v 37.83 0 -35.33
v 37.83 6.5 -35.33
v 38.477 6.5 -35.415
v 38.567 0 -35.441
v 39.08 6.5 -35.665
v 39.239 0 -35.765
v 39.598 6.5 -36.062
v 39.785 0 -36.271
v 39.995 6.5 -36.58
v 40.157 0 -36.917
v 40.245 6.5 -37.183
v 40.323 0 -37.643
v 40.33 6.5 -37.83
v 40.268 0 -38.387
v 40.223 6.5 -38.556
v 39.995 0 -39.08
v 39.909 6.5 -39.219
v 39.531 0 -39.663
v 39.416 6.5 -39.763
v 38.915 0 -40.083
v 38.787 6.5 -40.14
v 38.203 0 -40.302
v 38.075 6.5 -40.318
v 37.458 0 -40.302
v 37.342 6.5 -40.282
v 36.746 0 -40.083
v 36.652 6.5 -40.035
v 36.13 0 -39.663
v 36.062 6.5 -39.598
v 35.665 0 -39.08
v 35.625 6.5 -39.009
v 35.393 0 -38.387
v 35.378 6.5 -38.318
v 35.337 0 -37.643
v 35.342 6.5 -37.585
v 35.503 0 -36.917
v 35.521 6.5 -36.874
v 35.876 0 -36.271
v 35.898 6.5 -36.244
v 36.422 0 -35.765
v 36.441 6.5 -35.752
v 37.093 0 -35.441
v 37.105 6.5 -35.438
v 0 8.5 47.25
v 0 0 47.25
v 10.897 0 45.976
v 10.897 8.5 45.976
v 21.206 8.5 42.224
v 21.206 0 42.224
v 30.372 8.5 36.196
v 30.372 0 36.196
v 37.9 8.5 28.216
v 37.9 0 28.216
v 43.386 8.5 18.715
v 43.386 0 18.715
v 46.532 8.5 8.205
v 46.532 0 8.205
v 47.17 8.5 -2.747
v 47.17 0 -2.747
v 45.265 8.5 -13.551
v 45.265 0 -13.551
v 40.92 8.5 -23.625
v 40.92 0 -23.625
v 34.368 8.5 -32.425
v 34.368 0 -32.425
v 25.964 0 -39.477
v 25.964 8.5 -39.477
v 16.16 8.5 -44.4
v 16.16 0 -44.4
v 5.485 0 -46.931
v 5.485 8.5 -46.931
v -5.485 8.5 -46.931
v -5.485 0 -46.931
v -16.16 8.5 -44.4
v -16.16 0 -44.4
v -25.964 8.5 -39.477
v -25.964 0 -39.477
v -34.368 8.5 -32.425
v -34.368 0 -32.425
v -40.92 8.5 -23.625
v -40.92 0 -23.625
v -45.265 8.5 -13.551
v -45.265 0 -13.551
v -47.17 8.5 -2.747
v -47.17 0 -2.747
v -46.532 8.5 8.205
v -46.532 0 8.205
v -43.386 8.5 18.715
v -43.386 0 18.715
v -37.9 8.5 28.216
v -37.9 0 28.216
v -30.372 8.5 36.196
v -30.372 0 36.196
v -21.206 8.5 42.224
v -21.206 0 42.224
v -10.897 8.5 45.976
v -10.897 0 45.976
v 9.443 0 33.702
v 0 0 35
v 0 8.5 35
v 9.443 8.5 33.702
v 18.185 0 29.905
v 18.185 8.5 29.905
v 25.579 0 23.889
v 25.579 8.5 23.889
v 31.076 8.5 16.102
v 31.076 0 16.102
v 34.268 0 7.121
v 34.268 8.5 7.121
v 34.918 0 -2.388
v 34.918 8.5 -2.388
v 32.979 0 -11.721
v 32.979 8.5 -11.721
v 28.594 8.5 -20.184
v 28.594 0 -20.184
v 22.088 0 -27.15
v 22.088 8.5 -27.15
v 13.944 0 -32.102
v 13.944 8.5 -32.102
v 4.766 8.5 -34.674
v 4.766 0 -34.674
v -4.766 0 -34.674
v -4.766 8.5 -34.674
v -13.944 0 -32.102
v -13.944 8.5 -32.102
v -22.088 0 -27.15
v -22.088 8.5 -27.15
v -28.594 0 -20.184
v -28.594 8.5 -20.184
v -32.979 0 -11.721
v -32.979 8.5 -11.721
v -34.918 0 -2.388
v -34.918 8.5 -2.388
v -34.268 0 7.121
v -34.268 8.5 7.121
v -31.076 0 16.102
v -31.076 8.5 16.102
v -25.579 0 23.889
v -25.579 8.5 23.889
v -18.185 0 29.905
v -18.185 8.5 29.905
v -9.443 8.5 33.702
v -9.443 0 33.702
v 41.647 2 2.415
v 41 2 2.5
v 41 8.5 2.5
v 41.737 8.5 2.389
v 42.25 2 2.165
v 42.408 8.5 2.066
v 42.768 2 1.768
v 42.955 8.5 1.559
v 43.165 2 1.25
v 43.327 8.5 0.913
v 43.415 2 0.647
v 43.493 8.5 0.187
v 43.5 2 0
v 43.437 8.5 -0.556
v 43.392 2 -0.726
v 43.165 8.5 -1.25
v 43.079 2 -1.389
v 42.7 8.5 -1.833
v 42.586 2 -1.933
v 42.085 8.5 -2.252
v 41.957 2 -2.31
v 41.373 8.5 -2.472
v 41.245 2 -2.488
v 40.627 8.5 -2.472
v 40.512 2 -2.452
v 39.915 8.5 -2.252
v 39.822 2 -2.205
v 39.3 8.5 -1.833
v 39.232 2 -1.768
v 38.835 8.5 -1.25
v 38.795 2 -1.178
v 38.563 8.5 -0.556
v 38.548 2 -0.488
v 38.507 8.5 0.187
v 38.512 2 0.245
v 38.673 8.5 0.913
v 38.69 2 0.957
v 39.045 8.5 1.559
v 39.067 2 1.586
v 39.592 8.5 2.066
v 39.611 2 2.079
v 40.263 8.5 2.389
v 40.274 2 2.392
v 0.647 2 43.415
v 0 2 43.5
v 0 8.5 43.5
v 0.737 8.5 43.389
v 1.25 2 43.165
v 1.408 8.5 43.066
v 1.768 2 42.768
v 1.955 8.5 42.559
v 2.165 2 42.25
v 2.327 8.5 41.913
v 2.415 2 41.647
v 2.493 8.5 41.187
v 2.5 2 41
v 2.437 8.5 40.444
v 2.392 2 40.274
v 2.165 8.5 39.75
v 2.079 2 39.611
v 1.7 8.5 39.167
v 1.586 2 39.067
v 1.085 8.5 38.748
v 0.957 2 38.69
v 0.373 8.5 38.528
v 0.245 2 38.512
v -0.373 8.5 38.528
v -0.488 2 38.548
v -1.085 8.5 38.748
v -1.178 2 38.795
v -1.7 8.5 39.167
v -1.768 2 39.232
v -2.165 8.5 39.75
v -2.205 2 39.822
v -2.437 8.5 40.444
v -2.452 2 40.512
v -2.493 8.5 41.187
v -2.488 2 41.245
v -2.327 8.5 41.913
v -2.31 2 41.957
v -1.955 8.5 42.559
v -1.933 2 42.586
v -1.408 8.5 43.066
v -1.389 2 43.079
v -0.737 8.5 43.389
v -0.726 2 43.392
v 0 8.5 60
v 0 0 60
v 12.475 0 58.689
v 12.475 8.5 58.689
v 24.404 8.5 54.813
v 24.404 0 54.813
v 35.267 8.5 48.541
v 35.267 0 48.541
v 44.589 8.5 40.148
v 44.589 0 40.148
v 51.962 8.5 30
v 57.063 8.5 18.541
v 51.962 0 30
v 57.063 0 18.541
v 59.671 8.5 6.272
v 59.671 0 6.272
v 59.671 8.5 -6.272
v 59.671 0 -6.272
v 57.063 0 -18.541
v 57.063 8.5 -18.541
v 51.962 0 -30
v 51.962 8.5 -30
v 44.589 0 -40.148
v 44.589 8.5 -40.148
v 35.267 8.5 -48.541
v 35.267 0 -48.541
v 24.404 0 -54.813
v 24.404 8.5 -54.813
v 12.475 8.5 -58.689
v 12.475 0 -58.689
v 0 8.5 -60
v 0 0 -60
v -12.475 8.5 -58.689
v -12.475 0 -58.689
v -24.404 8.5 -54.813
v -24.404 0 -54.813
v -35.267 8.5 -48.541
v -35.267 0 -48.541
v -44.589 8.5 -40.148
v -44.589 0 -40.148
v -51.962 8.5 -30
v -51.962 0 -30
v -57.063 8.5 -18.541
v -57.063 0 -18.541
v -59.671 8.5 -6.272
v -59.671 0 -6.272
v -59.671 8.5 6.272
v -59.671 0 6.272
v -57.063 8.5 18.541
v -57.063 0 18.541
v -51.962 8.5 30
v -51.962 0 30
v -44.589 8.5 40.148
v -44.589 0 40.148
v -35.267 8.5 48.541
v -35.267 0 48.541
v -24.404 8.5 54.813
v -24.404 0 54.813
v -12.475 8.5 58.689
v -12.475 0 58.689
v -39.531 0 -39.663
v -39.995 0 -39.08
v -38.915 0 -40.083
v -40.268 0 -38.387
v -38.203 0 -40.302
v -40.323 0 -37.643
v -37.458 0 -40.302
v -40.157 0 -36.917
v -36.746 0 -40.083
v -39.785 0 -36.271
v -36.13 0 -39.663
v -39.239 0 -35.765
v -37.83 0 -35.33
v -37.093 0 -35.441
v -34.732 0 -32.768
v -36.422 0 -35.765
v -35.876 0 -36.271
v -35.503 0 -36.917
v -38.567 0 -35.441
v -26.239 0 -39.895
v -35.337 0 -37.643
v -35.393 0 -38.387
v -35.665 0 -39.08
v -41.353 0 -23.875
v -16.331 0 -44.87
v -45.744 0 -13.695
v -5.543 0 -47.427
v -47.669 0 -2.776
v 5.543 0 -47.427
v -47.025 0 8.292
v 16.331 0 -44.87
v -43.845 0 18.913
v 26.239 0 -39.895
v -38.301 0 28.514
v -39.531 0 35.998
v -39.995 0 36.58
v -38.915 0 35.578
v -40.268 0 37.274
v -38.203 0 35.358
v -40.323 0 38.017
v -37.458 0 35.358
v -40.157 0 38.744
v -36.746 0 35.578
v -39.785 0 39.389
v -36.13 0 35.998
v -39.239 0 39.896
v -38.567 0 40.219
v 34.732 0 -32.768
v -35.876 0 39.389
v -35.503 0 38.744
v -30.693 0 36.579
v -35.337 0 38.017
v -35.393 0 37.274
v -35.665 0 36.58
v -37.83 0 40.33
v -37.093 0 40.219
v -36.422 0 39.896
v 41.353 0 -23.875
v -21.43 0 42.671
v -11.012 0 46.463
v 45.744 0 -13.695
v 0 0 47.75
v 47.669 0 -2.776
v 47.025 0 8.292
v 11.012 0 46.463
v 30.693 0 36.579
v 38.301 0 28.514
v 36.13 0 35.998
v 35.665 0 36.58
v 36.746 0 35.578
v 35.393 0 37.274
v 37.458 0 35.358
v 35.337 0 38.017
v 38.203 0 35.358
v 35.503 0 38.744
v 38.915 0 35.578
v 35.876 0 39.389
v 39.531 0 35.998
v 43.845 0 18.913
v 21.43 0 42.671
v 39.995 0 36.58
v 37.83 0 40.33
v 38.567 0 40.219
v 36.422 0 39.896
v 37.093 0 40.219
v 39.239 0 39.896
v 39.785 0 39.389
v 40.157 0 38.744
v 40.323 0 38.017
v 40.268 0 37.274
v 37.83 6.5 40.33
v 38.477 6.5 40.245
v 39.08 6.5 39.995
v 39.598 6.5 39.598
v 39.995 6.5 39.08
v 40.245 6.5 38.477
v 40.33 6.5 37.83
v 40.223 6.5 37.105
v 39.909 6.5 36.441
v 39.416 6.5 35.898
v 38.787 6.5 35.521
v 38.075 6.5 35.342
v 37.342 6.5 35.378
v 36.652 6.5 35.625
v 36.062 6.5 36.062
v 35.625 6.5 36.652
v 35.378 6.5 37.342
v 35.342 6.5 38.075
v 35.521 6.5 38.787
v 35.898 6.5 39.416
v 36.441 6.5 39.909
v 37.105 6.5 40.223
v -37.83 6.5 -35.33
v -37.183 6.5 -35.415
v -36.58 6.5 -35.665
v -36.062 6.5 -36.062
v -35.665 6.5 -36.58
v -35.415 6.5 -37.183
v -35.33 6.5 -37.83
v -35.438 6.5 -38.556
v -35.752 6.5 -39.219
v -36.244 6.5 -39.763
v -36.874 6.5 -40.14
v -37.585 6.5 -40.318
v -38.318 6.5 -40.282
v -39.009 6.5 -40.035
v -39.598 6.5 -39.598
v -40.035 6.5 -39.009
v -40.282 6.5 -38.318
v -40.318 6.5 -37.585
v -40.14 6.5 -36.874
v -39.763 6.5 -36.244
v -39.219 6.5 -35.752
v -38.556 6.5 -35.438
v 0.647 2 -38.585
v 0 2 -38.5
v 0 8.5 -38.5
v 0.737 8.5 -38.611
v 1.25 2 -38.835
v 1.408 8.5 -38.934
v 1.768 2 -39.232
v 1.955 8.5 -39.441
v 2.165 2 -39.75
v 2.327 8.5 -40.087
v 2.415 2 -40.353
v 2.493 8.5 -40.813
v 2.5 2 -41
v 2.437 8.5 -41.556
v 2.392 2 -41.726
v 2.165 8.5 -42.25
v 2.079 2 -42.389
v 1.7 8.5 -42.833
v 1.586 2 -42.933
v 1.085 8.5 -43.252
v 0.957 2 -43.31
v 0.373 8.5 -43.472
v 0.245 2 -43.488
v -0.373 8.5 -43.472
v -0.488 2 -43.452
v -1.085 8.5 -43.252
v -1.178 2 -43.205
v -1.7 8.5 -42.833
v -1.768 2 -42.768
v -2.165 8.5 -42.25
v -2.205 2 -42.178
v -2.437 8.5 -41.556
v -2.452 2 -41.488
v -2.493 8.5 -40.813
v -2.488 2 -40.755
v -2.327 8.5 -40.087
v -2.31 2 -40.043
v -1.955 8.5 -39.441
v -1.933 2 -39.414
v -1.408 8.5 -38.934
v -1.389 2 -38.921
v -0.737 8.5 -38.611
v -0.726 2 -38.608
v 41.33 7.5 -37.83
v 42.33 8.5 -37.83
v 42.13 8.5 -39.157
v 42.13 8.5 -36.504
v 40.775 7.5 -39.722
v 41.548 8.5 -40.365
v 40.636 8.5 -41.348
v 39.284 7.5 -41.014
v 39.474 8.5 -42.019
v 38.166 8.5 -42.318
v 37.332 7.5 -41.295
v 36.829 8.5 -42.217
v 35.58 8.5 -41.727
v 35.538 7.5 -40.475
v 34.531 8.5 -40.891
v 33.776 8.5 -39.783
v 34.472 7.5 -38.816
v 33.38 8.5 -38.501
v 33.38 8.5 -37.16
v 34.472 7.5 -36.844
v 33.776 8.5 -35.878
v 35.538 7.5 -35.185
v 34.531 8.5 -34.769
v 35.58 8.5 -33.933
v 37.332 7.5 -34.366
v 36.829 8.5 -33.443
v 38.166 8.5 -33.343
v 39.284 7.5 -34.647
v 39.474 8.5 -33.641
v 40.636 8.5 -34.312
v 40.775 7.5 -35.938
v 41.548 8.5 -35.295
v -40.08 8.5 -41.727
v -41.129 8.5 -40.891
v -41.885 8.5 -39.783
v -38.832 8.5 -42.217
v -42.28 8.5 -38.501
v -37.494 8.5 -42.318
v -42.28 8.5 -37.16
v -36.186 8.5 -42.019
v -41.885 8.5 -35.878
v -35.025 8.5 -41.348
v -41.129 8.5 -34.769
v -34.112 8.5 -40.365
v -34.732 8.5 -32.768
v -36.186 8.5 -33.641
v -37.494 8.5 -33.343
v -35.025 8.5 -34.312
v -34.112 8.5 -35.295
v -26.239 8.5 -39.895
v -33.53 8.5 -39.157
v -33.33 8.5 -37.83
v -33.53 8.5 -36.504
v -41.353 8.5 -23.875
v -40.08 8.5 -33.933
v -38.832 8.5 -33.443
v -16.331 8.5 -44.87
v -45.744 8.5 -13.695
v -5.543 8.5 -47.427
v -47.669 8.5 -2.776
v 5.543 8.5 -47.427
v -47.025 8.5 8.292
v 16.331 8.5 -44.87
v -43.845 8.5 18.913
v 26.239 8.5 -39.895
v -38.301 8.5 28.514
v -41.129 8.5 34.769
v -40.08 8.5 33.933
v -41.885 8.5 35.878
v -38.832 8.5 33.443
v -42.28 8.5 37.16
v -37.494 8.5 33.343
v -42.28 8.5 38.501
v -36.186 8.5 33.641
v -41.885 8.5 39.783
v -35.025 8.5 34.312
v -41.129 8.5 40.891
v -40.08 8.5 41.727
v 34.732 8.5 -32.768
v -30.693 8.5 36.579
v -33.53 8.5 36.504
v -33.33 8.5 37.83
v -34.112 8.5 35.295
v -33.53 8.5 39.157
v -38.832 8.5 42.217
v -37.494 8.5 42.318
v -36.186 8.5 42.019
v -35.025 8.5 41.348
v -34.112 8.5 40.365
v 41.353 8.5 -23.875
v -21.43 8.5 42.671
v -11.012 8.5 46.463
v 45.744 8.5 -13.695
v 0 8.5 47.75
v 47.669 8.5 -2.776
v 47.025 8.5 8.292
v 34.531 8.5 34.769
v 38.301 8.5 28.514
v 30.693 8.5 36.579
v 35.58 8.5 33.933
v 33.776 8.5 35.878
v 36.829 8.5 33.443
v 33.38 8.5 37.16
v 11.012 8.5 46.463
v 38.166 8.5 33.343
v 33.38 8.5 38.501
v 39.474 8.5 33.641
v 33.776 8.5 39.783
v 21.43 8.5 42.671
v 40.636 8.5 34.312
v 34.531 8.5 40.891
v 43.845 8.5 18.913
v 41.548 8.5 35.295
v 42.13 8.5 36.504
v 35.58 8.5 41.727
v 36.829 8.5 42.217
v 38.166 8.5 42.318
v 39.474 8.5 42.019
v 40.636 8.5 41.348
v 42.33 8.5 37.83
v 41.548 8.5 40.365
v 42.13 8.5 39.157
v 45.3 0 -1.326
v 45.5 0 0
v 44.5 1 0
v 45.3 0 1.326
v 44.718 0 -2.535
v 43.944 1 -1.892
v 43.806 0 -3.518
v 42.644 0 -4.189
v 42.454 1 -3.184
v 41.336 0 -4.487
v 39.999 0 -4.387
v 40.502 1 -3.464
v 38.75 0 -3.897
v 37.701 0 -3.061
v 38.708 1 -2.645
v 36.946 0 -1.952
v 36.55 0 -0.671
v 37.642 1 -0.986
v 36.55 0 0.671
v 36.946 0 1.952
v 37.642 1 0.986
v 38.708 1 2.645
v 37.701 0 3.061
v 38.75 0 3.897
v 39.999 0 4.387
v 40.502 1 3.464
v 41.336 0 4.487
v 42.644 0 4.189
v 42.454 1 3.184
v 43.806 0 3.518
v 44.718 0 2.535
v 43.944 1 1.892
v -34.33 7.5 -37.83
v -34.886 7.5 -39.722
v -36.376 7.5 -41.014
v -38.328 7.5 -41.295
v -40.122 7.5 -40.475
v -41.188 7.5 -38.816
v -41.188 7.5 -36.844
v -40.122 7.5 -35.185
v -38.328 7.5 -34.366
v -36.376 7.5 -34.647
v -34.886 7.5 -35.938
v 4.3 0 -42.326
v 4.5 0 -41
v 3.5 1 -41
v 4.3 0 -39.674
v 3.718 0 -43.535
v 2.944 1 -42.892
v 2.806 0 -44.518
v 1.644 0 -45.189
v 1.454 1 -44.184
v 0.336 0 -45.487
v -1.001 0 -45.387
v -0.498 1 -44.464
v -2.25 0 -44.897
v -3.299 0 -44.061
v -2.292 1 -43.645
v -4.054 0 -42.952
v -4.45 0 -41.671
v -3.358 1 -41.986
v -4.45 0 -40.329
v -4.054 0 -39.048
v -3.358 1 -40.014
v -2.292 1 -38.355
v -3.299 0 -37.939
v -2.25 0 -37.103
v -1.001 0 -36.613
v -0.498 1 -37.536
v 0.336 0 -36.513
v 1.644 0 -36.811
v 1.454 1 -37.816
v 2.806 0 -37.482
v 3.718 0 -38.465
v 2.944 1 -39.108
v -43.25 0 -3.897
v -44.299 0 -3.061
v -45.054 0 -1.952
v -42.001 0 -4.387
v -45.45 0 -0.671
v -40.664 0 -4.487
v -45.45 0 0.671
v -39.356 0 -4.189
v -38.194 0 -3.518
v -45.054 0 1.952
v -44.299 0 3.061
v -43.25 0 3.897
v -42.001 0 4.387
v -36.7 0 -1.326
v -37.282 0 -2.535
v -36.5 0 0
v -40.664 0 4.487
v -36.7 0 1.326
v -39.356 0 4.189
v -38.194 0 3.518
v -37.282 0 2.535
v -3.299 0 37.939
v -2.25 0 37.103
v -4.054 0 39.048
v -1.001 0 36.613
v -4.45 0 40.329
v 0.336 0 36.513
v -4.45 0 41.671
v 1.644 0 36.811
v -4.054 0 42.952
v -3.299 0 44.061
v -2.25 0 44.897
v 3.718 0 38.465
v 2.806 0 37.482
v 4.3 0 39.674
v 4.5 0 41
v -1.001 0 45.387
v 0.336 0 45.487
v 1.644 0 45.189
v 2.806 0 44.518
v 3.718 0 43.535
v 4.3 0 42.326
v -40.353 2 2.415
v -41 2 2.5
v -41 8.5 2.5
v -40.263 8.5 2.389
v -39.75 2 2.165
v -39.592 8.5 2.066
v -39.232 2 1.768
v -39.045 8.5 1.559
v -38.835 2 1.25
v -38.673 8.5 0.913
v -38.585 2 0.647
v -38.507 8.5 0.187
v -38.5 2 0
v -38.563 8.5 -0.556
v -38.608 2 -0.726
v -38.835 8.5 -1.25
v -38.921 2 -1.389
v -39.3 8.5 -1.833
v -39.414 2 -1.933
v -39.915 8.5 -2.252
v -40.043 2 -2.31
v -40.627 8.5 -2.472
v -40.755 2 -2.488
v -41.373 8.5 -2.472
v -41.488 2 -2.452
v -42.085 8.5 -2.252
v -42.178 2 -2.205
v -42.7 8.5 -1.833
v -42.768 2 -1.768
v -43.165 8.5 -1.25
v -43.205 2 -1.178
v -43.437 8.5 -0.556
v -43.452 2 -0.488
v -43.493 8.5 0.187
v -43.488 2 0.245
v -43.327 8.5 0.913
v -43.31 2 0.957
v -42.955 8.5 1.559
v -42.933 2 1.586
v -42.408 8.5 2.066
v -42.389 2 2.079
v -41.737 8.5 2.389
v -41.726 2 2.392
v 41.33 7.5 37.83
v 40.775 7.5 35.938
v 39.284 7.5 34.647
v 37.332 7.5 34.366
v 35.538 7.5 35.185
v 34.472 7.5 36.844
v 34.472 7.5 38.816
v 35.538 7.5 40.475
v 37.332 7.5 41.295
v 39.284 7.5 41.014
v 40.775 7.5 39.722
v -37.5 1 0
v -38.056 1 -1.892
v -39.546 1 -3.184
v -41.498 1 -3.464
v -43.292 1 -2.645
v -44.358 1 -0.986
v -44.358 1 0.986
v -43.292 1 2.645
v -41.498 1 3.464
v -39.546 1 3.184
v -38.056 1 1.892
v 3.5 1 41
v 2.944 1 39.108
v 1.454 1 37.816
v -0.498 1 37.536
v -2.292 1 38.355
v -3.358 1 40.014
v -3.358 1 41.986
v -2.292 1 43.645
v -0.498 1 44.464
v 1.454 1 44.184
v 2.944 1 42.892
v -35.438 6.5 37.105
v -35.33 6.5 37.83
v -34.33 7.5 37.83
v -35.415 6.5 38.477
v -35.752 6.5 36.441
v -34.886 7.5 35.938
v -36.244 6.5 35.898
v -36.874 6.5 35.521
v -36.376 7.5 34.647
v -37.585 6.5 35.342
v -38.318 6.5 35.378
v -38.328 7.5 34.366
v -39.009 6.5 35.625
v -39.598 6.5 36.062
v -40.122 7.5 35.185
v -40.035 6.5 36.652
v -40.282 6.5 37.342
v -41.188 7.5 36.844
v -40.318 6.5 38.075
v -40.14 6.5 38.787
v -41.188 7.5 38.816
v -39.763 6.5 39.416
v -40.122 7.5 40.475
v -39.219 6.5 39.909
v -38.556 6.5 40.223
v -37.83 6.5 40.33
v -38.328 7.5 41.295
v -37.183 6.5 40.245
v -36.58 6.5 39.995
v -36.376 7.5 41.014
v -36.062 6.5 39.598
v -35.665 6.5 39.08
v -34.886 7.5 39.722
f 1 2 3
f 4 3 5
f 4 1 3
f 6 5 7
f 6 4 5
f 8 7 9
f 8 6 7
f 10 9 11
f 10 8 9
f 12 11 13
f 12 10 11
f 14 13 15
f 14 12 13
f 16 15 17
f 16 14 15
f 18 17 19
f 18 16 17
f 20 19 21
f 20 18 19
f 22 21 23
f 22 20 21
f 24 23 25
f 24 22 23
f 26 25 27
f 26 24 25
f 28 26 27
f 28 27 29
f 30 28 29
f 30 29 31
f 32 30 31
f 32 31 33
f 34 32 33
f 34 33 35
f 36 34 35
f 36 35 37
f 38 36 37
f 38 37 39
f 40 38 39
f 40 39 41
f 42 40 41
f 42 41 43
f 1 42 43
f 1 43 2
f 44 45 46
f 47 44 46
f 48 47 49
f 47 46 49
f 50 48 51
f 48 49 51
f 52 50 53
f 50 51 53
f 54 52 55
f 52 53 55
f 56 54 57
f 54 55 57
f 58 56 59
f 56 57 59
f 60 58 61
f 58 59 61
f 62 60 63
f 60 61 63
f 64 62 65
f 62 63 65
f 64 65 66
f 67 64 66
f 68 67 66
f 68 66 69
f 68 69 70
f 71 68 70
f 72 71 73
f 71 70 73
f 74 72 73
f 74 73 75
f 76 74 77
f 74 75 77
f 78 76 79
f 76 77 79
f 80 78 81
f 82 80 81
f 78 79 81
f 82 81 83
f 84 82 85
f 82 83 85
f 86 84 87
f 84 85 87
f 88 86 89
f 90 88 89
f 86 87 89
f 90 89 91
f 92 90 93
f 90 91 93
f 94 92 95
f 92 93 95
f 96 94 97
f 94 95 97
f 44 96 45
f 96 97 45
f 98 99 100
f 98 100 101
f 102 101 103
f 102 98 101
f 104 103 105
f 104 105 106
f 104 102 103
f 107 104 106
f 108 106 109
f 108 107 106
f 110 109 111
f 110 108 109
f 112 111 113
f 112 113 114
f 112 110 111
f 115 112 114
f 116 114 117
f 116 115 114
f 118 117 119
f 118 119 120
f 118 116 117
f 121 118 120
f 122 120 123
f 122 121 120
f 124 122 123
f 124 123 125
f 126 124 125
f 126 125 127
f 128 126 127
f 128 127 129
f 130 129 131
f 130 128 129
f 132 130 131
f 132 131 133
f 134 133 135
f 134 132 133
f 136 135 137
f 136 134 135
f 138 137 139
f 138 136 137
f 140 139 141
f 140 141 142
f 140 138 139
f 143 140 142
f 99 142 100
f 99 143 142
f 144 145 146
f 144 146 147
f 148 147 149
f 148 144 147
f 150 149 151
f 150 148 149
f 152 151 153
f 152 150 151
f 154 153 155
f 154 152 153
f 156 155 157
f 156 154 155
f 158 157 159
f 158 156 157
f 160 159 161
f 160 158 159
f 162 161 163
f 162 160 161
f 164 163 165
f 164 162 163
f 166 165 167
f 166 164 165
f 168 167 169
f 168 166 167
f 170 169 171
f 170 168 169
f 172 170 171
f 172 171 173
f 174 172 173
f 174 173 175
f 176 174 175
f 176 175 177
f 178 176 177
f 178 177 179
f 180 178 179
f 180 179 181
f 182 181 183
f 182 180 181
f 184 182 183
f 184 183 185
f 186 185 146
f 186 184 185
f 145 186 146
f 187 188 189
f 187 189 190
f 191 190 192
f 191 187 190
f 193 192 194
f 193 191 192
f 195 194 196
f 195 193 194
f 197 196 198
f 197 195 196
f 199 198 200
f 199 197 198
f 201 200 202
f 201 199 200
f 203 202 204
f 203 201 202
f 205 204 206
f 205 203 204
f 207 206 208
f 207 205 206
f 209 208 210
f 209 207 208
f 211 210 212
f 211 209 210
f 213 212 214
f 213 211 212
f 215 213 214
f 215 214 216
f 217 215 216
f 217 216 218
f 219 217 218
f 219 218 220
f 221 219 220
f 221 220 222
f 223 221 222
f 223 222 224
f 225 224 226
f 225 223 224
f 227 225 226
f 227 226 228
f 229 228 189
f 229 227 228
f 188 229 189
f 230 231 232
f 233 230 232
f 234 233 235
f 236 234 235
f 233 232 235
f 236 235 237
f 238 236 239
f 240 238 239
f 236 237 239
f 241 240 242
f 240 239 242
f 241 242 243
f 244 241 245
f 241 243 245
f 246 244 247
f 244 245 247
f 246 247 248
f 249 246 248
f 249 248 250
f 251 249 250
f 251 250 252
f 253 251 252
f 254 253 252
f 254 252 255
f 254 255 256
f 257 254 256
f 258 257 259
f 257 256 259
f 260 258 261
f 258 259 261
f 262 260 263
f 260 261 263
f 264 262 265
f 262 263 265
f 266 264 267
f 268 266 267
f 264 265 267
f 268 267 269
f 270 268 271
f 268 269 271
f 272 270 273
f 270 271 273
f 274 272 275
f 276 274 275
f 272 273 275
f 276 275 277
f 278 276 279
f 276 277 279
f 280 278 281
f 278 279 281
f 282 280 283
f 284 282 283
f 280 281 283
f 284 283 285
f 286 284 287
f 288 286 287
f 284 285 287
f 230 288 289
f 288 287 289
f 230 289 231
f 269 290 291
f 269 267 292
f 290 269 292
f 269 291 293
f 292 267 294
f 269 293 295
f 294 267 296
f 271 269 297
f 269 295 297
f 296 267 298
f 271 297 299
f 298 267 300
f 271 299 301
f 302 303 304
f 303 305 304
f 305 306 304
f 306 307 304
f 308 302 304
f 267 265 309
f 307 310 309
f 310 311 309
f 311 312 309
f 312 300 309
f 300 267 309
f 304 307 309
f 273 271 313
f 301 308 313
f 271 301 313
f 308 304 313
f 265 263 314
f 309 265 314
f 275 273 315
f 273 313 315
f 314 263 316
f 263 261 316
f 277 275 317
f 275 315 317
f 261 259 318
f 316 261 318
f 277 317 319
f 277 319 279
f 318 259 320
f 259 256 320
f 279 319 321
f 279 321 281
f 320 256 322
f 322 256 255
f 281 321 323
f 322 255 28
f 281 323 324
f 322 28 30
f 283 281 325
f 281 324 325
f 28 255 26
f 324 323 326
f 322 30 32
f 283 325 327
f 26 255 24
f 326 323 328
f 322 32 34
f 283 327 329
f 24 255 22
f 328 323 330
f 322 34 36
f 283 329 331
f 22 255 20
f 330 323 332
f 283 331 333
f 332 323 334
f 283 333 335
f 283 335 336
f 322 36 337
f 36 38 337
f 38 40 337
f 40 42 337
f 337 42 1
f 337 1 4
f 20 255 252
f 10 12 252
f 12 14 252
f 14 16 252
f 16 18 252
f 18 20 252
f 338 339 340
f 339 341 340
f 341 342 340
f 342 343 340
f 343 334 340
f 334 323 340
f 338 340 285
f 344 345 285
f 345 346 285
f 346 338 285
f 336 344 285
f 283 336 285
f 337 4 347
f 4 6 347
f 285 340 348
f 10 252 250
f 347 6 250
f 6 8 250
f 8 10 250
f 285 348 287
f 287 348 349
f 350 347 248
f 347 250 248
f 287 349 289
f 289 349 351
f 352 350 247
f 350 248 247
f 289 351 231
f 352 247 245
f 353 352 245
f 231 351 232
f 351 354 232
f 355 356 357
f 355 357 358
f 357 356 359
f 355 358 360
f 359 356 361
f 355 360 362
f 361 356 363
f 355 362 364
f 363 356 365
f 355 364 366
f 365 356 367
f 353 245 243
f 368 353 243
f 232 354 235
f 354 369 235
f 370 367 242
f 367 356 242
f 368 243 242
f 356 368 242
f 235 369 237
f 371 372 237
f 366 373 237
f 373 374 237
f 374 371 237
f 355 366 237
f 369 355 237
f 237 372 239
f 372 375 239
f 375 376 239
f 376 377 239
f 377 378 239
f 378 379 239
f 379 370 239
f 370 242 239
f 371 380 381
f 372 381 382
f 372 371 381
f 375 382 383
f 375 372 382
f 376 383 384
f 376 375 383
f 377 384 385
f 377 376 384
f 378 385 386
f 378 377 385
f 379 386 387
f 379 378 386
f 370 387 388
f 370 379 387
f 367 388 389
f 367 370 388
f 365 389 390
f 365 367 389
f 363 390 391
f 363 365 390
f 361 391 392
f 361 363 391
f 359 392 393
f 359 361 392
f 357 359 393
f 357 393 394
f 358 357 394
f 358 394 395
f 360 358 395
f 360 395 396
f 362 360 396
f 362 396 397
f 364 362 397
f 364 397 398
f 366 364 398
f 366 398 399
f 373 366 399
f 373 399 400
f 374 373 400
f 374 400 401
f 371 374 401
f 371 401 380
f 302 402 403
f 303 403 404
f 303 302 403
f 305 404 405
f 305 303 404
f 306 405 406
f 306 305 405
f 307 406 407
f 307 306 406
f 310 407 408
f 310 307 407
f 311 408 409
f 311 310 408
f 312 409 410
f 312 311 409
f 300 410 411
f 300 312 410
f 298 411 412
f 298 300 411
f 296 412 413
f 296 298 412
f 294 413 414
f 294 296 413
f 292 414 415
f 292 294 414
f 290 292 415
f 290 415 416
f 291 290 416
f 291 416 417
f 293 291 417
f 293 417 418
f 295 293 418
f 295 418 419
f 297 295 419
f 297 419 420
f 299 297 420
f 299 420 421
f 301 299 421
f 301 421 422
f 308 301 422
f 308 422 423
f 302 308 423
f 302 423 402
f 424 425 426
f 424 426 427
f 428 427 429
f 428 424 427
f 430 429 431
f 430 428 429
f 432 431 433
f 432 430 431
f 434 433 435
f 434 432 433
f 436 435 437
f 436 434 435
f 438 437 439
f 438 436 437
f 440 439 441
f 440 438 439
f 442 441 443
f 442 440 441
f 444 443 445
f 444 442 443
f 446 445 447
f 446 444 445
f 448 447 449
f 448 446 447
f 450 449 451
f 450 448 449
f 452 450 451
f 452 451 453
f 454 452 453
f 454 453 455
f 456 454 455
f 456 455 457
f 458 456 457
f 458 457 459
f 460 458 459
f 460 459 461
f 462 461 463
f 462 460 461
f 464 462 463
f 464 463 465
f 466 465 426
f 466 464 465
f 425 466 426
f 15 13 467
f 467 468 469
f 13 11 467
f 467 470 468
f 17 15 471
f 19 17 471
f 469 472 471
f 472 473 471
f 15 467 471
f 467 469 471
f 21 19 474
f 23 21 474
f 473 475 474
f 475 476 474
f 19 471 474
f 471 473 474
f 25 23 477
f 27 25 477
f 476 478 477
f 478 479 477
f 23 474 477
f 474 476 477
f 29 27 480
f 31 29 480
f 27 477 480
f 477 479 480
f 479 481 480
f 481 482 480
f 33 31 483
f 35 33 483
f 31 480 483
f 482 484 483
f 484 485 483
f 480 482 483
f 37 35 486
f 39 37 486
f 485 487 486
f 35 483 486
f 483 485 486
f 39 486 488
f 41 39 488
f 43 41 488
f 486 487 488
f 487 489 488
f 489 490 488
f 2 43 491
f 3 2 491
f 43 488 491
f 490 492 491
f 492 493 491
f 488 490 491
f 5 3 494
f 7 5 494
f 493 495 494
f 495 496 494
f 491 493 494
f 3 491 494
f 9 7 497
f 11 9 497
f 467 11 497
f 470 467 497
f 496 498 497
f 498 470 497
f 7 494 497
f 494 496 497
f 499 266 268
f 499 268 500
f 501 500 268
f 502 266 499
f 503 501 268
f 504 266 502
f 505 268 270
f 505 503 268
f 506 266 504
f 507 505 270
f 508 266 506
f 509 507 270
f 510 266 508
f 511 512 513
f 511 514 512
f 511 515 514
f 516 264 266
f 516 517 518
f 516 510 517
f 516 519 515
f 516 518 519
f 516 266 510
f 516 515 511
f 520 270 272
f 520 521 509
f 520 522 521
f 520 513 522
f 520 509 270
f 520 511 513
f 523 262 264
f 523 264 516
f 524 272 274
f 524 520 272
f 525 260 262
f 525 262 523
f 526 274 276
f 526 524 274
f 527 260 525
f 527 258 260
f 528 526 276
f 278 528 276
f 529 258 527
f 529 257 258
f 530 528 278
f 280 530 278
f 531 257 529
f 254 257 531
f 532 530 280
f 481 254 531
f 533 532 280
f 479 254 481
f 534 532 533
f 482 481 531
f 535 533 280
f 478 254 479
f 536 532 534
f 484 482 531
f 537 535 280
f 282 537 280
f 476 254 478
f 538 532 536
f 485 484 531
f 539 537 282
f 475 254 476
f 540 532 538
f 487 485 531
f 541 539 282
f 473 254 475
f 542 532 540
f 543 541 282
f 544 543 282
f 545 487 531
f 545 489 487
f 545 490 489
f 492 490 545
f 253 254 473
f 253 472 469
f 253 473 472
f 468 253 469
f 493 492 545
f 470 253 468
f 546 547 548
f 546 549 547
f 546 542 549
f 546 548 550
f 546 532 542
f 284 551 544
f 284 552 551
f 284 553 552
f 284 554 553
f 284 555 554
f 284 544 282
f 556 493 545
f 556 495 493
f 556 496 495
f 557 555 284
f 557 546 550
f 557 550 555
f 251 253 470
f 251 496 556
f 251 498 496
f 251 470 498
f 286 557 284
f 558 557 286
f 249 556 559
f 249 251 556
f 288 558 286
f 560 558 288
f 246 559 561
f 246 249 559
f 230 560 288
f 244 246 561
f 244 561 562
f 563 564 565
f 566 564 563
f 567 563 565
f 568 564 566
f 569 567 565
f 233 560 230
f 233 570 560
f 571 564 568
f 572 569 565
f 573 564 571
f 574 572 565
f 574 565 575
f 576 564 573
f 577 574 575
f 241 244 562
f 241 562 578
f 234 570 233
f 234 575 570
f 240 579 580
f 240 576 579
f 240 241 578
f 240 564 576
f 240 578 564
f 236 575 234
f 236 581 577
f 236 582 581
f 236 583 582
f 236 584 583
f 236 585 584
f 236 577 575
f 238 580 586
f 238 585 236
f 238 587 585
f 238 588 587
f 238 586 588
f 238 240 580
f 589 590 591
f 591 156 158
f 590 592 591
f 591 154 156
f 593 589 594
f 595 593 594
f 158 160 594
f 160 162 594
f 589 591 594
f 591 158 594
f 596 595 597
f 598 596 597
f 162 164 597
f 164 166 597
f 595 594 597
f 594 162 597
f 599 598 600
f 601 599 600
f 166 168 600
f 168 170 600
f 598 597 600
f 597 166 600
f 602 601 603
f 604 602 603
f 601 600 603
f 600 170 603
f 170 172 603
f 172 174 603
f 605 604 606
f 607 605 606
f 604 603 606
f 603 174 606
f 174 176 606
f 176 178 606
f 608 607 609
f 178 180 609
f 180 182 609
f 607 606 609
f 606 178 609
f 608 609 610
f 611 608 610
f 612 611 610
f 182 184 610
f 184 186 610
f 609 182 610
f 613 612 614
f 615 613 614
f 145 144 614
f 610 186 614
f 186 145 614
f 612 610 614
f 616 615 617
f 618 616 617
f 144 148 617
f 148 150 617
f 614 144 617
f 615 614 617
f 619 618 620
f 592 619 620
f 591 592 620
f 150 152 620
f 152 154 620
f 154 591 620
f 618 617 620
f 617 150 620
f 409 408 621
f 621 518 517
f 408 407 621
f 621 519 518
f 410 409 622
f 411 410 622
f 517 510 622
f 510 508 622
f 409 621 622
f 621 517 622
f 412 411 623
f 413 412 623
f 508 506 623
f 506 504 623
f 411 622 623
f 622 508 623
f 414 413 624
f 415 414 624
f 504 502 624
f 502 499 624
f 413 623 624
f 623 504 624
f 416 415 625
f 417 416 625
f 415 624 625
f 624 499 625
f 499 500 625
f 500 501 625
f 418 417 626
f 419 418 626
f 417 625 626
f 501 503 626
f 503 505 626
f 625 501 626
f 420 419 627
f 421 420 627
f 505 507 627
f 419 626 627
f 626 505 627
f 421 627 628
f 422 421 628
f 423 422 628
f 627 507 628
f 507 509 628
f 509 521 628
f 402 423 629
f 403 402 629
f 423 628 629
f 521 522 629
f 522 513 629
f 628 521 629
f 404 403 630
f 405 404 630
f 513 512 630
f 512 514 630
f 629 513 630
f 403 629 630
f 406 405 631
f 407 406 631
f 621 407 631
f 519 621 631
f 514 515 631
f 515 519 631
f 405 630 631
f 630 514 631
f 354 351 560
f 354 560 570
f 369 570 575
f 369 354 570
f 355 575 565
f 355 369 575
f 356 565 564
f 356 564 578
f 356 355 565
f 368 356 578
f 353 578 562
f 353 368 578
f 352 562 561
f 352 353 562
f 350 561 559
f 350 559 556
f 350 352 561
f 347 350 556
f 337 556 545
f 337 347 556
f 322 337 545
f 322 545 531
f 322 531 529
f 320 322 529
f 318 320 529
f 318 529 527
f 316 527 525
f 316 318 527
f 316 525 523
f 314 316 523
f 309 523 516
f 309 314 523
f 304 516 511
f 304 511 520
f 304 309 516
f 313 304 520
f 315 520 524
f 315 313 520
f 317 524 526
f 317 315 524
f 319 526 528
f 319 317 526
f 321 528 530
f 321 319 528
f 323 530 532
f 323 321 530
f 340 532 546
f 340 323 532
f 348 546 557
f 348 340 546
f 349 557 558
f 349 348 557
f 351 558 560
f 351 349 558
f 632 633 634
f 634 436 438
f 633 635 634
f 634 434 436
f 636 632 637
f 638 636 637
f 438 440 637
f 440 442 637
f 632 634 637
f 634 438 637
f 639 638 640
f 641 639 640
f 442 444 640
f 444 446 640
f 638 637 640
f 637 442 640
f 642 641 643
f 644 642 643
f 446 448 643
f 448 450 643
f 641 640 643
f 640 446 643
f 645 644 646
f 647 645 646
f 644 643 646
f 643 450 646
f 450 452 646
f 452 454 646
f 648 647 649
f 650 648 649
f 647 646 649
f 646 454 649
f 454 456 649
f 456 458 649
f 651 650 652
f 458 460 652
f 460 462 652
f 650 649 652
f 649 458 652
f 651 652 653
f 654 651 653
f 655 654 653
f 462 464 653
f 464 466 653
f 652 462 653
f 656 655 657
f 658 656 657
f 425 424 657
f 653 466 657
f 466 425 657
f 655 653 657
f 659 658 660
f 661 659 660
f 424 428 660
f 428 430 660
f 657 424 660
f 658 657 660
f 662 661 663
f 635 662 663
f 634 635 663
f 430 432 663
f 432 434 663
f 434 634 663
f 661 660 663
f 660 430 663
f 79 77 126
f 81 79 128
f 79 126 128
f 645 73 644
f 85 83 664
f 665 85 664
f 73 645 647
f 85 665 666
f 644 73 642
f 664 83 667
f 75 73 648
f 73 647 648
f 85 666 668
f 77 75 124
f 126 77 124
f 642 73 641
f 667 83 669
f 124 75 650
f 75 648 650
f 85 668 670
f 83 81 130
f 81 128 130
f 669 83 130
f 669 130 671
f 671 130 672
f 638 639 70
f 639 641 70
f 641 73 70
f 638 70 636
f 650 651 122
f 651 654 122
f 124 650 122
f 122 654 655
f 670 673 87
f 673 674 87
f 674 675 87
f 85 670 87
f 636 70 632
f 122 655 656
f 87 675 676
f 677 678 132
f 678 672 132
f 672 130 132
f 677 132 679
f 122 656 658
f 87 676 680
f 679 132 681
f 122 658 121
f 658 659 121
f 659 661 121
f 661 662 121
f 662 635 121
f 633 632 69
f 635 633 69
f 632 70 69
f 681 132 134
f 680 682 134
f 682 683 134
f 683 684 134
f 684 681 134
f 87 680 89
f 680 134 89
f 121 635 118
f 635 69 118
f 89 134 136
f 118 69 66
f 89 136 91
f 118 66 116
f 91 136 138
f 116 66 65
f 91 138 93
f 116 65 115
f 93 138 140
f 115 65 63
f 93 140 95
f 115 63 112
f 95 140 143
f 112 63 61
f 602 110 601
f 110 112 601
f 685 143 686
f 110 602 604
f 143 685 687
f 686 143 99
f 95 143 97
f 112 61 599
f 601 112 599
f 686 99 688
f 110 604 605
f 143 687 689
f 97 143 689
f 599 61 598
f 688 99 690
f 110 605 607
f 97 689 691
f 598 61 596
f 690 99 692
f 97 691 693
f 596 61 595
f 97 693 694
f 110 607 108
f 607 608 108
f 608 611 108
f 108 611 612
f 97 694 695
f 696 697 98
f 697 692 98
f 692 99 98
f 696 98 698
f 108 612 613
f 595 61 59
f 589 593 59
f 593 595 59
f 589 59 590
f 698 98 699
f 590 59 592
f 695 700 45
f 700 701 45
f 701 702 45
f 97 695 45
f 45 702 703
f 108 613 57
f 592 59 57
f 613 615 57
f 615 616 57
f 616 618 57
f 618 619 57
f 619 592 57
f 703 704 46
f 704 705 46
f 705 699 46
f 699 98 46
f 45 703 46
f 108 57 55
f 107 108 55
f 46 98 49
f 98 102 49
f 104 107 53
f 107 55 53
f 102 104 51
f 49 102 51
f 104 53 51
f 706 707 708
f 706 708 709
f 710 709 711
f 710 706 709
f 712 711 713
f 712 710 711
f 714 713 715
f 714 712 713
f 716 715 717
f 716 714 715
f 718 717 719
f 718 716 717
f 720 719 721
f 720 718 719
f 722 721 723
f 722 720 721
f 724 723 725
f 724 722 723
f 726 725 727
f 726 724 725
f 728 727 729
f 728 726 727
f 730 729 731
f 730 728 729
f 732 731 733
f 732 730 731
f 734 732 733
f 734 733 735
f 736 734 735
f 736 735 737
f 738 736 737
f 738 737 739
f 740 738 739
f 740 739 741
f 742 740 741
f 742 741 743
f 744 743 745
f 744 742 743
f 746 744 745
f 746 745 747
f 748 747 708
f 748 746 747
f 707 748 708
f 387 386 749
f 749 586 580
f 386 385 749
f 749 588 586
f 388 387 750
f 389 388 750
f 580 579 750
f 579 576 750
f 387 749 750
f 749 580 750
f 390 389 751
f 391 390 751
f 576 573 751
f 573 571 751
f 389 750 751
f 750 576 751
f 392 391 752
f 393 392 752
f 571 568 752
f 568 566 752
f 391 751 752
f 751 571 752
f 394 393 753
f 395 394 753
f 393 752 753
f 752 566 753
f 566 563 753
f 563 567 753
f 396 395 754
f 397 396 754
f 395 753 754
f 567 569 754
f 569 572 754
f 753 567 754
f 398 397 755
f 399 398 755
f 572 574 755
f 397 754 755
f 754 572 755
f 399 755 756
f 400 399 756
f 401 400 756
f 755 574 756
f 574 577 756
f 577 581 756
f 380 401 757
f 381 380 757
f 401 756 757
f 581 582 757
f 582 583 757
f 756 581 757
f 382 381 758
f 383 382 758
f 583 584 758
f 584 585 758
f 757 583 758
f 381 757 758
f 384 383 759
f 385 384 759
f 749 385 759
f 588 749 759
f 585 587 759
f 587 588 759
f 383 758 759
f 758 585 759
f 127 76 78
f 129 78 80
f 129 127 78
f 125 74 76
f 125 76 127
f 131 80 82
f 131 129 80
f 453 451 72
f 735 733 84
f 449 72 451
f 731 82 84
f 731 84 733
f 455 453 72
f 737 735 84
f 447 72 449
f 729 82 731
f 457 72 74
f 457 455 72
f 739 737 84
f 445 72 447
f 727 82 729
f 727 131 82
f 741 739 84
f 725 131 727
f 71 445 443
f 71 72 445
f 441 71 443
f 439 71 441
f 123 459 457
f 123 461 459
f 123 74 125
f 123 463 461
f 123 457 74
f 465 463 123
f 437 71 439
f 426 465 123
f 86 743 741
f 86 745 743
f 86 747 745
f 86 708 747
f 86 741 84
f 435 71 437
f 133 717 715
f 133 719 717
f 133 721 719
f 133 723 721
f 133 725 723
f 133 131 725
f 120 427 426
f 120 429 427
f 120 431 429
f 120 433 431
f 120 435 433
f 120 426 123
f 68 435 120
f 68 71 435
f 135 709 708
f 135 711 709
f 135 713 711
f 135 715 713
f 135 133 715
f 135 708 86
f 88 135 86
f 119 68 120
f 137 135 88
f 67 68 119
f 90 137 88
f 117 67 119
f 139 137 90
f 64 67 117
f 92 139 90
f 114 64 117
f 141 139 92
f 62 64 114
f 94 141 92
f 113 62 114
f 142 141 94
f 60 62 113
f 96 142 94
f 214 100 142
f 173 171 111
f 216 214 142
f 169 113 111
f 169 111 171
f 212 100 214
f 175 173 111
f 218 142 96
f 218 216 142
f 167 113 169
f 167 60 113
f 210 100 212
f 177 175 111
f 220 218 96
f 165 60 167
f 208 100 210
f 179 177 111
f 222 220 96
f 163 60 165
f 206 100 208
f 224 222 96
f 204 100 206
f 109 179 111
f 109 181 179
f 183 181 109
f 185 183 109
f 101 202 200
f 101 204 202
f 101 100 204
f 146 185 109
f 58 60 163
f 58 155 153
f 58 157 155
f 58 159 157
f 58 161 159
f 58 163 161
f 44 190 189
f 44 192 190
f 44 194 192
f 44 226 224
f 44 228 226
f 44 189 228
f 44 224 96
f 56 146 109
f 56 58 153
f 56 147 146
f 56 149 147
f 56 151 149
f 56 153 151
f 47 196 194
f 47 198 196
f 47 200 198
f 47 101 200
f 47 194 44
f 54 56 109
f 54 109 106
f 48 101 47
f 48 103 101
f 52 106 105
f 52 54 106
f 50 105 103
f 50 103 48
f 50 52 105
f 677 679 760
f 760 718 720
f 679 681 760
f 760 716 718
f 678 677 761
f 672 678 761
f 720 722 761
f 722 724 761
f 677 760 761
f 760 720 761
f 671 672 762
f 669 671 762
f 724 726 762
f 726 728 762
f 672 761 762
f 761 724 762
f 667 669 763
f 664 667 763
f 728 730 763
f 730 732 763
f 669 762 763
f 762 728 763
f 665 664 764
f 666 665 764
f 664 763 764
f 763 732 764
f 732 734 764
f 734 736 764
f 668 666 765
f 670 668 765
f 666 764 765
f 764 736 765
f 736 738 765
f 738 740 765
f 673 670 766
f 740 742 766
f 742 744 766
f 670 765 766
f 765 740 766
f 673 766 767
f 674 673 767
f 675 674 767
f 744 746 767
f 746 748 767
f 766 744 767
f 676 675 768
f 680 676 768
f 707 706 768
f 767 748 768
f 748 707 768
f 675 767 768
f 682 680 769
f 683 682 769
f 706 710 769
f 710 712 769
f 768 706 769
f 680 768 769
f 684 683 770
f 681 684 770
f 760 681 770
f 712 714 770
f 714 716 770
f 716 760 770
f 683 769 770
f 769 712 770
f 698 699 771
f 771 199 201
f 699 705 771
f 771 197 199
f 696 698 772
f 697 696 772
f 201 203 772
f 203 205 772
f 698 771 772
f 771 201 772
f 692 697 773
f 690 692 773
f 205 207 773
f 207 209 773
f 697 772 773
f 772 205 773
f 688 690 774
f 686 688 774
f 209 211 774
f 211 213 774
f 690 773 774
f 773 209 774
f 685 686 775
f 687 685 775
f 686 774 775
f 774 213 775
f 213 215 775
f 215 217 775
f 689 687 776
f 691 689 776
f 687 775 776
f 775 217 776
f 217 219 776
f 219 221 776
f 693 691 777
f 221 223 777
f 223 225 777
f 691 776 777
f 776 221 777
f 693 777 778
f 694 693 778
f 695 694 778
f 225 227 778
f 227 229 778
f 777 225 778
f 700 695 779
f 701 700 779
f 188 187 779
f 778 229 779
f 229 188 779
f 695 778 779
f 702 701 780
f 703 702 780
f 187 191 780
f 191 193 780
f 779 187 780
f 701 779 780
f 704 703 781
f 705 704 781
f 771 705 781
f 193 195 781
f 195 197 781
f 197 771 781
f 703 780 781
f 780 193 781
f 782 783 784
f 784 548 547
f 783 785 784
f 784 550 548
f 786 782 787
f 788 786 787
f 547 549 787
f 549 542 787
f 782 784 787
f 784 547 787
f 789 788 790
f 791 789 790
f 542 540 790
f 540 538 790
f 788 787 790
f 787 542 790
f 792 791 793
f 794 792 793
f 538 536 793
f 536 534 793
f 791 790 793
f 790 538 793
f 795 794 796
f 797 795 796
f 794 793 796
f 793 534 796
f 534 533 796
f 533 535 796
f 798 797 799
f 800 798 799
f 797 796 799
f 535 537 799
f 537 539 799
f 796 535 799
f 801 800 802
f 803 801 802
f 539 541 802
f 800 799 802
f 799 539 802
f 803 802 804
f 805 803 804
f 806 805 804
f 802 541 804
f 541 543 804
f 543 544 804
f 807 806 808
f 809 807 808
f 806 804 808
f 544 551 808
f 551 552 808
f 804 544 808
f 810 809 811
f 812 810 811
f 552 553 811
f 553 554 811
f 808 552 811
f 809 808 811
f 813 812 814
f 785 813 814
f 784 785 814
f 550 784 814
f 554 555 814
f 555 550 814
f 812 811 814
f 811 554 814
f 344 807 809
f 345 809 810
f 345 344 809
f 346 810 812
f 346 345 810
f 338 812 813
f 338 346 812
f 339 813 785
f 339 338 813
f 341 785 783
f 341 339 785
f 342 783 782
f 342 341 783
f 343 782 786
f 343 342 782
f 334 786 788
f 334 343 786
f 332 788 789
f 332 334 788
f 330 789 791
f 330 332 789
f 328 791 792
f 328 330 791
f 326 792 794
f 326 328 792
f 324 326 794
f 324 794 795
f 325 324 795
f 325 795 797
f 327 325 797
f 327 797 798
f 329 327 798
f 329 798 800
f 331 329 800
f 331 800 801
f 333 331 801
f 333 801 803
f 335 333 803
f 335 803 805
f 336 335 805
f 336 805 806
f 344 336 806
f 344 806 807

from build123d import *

# Parameters (mm, degrees)
SKETCH_1_R        = 60
SKETCH_1_R_2      = 47.75
SKETCH_1_R_3      = 2.5
EXTRUDE_1_DEPTH   = 8.5
SKETCH_1_R_4      = 47.25
SKETCH_1_R_5      = 35
EXTRUDE_1_2_DEPTH = 8.5


# Read off the part's stored shape, not the designer's step: 打孔尺寸(%根据)内六角花形半沉头螺钉的类型1
with BuildPart() as part:
    # 草图1 → 凸台-拉伸1 (new body)
    with BuildSketch(Plane(origin=(0, 0, 0), x_dir=(1, 0, 0), z_dir=(0, 1, 0))):
        with Locations(Location((0, 0, 0), (0, 0, 270))):
            Circle(SKETCH_1_R)
        with Locations(Location((0, 0, 0), (0, 0, 270))):
            Circle(SKETCH_1_R_2, mode=Mode.SUBTRACT)
        with Locations(Location((37.830212793, -37.830212793, 0), (0, 0, 270))):
            Circle(SKETCH_1_R_3, mode=Mode.SUBTRACT)
        with Locations(Location((-37.830212793, -37.830212793, 0), (0, 0, 270))):
            Circle(SKETCH_1_R_3, mode=Mode.SUBTRACT)
        with Locations(Location((-37.830212793, 37.830212793, 0), (0, 0, 270))):
            Circle(SKETCH_1_R_3, mode=Mode.SUBTRACT)
        with Locations(Location((37.830212793, 37.830212793, 0), (0, 0, 270))):
            Circle(SKETCH_1_R_3, mode=Mode.SUBTRACT)
    extrude(amount=EXTRUDE_1_DEPTH)

    # Hole Wizard 1 5 outline → Hole Wizard 1 5 (revolve, cut)
    with BuildSketch(Plane(origin=(-37.830212793, 0, 37.830212793), x_dir=(1, 0, 0), z_dir=(0, 0, 1))):
        Polygon((2.5, 8.5), (2.5, 6.5), (4.5, 8.5), align=None)
    revolve(axis=Axis((-37.830212793, 0, 37.830212793), (0, 1, 0)), mode=Mode.SUBTRACT)

    # Hole Wizard 1 6 outline → Hole Wizard 1 6 (revolve, cut)
    with BuildSketch(Plane(origin=(37.830212793, 0, 37.830212793), x_dir=(1, 0, 0), z_dir=(0, 0, 1))):
        Polygon((2.5, 8.5), (2.5, 6.5), (4.5, 8.5), align=None)
    revolve(axis=Axis((37.830212793, 0, 37.830212793), (0, 1, 0)), mode=Mode.SUBTRACT)

    # Hole Wizard 1 7 outline → Hole Wizard 1 7 (revolve, cut)
    with BuildSketch(Plane(origin=(37.830212793, 0, -37.830212793), x_dir=(1, 0, 0), z_dir=(0, 0, 1))):
        Polygon((2.5, 8.5), (2.5, 6.5), (4.5, 8.5), align=None)
    revolve(axis=Axis((37.830212793, 0, -37.830212793), (0, 1, 0)), mode=Mode.SUBTRACT)

    # Hole Wizard 1 8 outline → Hole Wizard 1 8 (revolve, cut)
    with BuildSketch(Plane(origin=(-37.830212793, 0, -37.830212793), x_dir=(1, 0, 0), z_dir=(0, 0, 1))):
        Polygon((2.5, 8.5), (2.5, 6.5), (4.5, 8.5), align=None)
    revolve(axis=Axis((-37.830212793, 0, -37.830212793), (0, 1, 0)), mode=Mode.SUBTRACT)


with BuildPart() as body_2:
    # 草图1 → Extrude 1 2 (new body)
    with BuildSketch(Plane(origin=(0, 0, 0), x_dir=(1, 0, 0), z_dir=(0, 1, 0))):
        with Locations(Location((0, 0, 0), (0, 0, 270))):
            Circle(SKETCH_1_R_4)
        with Locations(Location((0, -41, 0), (0, 0, 270))):
            Circle(SKETCH_1_R_3, mode=Mode.SUBTRACT)
        with Locations(Location((-41, 0, 0), (0, 0, 270))):
            Circle(SKETCH_1_R_3, mode=Mode.SUBTRACT)
        with Locations(Location((0, 41, 0), (0, 0, 270))):
            Circle(SKETCH_1_R_3, mode=Mode.SUBTRACT)
        with Locations(Location((41, 0, 0), (0, 0, 270))):
            Circle(SKETCH_1_R_3, mode=Mode.SUBTRACT)
        with Locations(Location((0, 0, 0), (0, 0, 270))):
            Circle(SKETCH_1_R_5, mode=Mode.SUBTRACT)
    extrude(amount=EXTRUDE_1_2_DEPTH)

    # 打孔尺寸(%根据)内六角花形半沉头螺钉的类型1 outline → 打孔尺寸(%根据)内六角花形半沉头螺钉的类型1 (revolve, cut)
    with BuildSketch(Plane.XY.offset(-41)):
        Polygon((4.5, 0), (2.5, 2), (2.5, 0), align=None)
    revolve(axis=Axis((0, 0, -41), (0, 1, 0)), mode=Mode.SUBTRACT)

    # Hole Wizard 1 2 outline → Hole Wizard 1 2 (revolve, cut)
    with BuildSketch(Plane(origin=(41, 0, 0), x_dir=(1, 0, 0), z_dir=(0, 0, 1))):
        Polygon((4.5, 0), (2.5, 2), (2.5, 0), align=None)
    revolve(axis=Axis((41, 0, 0), (0, 1, 0)), mode=Mode.SUBTRACT)

    # Hole Wizard 1 3 outline → Hole Wizard 1 3 (revolve, cut)
    with BuildSketch(Plane.XY.offset(41)):
        Polygon((4.5, 0), (2.5, 2), (2.5, 0), align=None)
    revolve(axis=Axis((0, 0, 41), (0, 1, 0)), mode=Mode.SUBTRACT)

    # Hole Wizard 1 4 outline → Hole Wizard 1 4 (revolve, cut)
    with BuildSketch(Plane(origin=(-41, 0, 0), x_dir=(1, 0, 0), z_dir=(0, 0, 1))):
        Polygon((4.5, 0), (2.5, 2), (2.5, 0), align=None)
    revolve(axis=Axis((-41, 0, 0), (0, 1, 0)), mode=Mode.SUBTRACT)


solid = Compound([part.part, body_2.part])
